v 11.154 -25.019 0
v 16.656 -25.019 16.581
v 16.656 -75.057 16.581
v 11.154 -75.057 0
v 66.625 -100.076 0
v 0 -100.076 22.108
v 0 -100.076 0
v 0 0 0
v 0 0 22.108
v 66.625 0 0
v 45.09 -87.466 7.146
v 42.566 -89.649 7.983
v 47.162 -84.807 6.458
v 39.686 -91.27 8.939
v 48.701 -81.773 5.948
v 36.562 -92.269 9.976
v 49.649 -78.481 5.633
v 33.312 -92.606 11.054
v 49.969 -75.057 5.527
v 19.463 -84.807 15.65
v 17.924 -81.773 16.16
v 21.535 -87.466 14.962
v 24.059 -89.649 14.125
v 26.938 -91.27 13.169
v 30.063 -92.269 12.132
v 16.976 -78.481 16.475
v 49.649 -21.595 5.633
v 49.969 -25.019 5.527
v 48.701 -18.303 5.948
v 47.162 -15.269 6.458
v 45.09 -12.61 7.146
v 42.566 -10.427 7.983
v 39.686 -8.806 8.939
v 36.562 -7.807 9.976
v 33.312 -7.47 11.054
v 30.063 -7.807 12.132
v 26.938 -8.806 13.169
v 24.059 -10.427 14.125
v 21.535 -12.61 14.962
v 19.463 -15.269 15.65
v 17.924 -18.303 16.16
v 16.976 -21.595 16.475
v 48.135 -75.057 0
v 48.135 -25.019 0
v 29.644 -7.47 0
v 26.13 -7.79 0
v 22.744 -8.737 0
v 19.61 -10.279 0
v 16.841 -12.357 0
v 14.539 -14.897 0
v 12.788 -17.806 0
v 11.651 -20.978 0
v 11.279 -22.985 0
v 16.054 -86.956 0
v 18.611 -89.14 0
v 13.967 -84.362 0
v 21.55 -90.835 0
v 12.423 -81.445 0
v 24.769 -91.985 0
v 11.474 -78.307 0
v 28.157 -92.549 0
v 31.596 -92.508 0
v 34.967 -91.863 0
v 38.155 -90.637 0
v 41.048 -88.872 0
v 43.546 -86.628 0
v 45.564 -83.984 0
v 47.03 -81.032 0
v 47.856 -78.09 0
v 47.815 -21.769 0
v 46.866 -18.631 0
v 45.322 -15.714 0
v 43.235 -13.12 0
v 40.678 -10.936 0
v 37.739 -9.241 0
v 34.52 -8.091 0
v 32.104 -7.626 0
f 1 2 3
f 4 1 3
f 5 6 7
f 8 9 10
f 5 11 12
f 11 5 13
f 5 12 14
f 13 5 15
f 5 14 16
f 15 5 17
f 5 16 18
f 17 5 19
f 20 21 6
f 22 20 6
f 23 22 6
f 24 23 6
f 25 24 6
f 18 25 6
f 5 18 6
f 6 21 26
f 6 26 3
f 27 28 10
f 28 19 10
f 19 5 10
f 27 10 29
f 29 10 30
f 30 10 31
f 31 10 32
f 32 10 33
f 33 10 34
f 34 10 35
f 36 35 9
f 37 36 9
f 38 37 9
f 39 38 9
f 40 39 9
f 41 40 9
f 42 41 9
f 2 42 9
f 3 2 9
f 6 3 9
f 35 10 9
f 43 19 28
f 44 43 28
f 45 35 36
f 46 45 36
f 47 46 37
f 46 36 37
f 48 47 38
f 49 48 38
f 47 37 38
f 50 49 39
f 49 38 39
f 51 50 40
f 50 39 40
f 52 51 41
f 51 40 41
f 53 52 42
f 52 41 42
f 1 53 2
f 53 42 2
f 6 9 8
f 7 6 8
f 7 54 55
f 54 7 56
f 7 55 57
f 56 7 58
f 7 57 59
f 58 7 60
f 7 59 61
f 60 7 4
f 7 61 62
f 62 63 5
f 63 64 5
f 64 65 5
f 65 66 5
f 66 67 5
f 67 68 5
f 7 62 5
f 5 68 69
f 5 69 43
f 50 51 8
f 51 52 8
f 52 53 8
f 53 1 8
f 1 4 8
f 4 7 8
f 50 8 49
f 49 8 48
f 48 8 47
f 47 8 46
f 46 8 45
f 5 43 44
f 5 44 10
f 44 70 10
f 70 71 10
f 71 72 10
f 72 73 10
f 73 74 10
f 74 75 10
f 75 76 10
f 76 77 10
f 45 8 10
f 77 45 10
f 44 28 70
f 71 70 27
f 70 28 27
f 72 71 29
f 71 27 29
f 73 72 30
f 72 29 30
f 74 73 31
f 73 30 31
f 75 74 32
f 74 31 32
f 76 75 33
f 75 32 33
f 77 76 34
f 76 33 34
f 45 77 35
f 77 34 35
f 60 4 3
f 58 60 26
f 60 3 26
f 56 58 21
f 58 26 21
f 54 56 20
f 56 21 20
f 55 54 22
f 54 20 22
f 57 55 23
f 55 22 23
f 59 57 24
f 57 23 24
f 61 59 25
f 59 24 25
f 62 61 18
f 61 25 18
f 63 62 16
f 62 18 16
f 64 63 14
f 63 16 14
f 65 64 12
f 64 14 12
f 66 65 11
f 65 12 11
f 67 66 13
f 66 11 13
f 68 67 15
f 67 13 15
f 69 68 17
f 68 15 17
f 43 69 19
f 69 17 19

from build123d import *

# Parameters (mm, degrees)
F1_DEPTH = 100.076
F3_DEPTH = 48.26


with BuildPart() as f1:
    # F0 (on Front) → F1 (new body)
    with BuildSketch(Plane.XZ):
        Polygon((0, 22.108026), (0, 0), (66.624872, 0), align=None)
    extrude(amount=F1_DEPTH)

    # F2 (on face) → F3 (cut)
    with BuildSketch(Plane(origin=(6.608418, 0, 19.915165), x_dir=(0.949111, 0, -0.314942), z_dir=(0.314942, 0, 0.949111))):
        with BuildLine():
            ThreePointArc((28.135825, -7.469715), (15.726606, -12.609782), (10.58654, -25.019))
            Line((10.58654, -25.019), (10.58654, -75.057))
            ThreePointArc((10.58654, -75.057), (28.135825, -92.606285), (45.685109, -75.057))
            Line((45.685109, -75.057), (45.685109, -25.019))
            ThreePointArc((45.685109, -25.019), (40.545043, -12.609782), (28.135825, -7.469715))
        make_face()
    extrude(amount=-F3_DEPTH, mode=Mode.SUBTRACT)


solid = f1.part
